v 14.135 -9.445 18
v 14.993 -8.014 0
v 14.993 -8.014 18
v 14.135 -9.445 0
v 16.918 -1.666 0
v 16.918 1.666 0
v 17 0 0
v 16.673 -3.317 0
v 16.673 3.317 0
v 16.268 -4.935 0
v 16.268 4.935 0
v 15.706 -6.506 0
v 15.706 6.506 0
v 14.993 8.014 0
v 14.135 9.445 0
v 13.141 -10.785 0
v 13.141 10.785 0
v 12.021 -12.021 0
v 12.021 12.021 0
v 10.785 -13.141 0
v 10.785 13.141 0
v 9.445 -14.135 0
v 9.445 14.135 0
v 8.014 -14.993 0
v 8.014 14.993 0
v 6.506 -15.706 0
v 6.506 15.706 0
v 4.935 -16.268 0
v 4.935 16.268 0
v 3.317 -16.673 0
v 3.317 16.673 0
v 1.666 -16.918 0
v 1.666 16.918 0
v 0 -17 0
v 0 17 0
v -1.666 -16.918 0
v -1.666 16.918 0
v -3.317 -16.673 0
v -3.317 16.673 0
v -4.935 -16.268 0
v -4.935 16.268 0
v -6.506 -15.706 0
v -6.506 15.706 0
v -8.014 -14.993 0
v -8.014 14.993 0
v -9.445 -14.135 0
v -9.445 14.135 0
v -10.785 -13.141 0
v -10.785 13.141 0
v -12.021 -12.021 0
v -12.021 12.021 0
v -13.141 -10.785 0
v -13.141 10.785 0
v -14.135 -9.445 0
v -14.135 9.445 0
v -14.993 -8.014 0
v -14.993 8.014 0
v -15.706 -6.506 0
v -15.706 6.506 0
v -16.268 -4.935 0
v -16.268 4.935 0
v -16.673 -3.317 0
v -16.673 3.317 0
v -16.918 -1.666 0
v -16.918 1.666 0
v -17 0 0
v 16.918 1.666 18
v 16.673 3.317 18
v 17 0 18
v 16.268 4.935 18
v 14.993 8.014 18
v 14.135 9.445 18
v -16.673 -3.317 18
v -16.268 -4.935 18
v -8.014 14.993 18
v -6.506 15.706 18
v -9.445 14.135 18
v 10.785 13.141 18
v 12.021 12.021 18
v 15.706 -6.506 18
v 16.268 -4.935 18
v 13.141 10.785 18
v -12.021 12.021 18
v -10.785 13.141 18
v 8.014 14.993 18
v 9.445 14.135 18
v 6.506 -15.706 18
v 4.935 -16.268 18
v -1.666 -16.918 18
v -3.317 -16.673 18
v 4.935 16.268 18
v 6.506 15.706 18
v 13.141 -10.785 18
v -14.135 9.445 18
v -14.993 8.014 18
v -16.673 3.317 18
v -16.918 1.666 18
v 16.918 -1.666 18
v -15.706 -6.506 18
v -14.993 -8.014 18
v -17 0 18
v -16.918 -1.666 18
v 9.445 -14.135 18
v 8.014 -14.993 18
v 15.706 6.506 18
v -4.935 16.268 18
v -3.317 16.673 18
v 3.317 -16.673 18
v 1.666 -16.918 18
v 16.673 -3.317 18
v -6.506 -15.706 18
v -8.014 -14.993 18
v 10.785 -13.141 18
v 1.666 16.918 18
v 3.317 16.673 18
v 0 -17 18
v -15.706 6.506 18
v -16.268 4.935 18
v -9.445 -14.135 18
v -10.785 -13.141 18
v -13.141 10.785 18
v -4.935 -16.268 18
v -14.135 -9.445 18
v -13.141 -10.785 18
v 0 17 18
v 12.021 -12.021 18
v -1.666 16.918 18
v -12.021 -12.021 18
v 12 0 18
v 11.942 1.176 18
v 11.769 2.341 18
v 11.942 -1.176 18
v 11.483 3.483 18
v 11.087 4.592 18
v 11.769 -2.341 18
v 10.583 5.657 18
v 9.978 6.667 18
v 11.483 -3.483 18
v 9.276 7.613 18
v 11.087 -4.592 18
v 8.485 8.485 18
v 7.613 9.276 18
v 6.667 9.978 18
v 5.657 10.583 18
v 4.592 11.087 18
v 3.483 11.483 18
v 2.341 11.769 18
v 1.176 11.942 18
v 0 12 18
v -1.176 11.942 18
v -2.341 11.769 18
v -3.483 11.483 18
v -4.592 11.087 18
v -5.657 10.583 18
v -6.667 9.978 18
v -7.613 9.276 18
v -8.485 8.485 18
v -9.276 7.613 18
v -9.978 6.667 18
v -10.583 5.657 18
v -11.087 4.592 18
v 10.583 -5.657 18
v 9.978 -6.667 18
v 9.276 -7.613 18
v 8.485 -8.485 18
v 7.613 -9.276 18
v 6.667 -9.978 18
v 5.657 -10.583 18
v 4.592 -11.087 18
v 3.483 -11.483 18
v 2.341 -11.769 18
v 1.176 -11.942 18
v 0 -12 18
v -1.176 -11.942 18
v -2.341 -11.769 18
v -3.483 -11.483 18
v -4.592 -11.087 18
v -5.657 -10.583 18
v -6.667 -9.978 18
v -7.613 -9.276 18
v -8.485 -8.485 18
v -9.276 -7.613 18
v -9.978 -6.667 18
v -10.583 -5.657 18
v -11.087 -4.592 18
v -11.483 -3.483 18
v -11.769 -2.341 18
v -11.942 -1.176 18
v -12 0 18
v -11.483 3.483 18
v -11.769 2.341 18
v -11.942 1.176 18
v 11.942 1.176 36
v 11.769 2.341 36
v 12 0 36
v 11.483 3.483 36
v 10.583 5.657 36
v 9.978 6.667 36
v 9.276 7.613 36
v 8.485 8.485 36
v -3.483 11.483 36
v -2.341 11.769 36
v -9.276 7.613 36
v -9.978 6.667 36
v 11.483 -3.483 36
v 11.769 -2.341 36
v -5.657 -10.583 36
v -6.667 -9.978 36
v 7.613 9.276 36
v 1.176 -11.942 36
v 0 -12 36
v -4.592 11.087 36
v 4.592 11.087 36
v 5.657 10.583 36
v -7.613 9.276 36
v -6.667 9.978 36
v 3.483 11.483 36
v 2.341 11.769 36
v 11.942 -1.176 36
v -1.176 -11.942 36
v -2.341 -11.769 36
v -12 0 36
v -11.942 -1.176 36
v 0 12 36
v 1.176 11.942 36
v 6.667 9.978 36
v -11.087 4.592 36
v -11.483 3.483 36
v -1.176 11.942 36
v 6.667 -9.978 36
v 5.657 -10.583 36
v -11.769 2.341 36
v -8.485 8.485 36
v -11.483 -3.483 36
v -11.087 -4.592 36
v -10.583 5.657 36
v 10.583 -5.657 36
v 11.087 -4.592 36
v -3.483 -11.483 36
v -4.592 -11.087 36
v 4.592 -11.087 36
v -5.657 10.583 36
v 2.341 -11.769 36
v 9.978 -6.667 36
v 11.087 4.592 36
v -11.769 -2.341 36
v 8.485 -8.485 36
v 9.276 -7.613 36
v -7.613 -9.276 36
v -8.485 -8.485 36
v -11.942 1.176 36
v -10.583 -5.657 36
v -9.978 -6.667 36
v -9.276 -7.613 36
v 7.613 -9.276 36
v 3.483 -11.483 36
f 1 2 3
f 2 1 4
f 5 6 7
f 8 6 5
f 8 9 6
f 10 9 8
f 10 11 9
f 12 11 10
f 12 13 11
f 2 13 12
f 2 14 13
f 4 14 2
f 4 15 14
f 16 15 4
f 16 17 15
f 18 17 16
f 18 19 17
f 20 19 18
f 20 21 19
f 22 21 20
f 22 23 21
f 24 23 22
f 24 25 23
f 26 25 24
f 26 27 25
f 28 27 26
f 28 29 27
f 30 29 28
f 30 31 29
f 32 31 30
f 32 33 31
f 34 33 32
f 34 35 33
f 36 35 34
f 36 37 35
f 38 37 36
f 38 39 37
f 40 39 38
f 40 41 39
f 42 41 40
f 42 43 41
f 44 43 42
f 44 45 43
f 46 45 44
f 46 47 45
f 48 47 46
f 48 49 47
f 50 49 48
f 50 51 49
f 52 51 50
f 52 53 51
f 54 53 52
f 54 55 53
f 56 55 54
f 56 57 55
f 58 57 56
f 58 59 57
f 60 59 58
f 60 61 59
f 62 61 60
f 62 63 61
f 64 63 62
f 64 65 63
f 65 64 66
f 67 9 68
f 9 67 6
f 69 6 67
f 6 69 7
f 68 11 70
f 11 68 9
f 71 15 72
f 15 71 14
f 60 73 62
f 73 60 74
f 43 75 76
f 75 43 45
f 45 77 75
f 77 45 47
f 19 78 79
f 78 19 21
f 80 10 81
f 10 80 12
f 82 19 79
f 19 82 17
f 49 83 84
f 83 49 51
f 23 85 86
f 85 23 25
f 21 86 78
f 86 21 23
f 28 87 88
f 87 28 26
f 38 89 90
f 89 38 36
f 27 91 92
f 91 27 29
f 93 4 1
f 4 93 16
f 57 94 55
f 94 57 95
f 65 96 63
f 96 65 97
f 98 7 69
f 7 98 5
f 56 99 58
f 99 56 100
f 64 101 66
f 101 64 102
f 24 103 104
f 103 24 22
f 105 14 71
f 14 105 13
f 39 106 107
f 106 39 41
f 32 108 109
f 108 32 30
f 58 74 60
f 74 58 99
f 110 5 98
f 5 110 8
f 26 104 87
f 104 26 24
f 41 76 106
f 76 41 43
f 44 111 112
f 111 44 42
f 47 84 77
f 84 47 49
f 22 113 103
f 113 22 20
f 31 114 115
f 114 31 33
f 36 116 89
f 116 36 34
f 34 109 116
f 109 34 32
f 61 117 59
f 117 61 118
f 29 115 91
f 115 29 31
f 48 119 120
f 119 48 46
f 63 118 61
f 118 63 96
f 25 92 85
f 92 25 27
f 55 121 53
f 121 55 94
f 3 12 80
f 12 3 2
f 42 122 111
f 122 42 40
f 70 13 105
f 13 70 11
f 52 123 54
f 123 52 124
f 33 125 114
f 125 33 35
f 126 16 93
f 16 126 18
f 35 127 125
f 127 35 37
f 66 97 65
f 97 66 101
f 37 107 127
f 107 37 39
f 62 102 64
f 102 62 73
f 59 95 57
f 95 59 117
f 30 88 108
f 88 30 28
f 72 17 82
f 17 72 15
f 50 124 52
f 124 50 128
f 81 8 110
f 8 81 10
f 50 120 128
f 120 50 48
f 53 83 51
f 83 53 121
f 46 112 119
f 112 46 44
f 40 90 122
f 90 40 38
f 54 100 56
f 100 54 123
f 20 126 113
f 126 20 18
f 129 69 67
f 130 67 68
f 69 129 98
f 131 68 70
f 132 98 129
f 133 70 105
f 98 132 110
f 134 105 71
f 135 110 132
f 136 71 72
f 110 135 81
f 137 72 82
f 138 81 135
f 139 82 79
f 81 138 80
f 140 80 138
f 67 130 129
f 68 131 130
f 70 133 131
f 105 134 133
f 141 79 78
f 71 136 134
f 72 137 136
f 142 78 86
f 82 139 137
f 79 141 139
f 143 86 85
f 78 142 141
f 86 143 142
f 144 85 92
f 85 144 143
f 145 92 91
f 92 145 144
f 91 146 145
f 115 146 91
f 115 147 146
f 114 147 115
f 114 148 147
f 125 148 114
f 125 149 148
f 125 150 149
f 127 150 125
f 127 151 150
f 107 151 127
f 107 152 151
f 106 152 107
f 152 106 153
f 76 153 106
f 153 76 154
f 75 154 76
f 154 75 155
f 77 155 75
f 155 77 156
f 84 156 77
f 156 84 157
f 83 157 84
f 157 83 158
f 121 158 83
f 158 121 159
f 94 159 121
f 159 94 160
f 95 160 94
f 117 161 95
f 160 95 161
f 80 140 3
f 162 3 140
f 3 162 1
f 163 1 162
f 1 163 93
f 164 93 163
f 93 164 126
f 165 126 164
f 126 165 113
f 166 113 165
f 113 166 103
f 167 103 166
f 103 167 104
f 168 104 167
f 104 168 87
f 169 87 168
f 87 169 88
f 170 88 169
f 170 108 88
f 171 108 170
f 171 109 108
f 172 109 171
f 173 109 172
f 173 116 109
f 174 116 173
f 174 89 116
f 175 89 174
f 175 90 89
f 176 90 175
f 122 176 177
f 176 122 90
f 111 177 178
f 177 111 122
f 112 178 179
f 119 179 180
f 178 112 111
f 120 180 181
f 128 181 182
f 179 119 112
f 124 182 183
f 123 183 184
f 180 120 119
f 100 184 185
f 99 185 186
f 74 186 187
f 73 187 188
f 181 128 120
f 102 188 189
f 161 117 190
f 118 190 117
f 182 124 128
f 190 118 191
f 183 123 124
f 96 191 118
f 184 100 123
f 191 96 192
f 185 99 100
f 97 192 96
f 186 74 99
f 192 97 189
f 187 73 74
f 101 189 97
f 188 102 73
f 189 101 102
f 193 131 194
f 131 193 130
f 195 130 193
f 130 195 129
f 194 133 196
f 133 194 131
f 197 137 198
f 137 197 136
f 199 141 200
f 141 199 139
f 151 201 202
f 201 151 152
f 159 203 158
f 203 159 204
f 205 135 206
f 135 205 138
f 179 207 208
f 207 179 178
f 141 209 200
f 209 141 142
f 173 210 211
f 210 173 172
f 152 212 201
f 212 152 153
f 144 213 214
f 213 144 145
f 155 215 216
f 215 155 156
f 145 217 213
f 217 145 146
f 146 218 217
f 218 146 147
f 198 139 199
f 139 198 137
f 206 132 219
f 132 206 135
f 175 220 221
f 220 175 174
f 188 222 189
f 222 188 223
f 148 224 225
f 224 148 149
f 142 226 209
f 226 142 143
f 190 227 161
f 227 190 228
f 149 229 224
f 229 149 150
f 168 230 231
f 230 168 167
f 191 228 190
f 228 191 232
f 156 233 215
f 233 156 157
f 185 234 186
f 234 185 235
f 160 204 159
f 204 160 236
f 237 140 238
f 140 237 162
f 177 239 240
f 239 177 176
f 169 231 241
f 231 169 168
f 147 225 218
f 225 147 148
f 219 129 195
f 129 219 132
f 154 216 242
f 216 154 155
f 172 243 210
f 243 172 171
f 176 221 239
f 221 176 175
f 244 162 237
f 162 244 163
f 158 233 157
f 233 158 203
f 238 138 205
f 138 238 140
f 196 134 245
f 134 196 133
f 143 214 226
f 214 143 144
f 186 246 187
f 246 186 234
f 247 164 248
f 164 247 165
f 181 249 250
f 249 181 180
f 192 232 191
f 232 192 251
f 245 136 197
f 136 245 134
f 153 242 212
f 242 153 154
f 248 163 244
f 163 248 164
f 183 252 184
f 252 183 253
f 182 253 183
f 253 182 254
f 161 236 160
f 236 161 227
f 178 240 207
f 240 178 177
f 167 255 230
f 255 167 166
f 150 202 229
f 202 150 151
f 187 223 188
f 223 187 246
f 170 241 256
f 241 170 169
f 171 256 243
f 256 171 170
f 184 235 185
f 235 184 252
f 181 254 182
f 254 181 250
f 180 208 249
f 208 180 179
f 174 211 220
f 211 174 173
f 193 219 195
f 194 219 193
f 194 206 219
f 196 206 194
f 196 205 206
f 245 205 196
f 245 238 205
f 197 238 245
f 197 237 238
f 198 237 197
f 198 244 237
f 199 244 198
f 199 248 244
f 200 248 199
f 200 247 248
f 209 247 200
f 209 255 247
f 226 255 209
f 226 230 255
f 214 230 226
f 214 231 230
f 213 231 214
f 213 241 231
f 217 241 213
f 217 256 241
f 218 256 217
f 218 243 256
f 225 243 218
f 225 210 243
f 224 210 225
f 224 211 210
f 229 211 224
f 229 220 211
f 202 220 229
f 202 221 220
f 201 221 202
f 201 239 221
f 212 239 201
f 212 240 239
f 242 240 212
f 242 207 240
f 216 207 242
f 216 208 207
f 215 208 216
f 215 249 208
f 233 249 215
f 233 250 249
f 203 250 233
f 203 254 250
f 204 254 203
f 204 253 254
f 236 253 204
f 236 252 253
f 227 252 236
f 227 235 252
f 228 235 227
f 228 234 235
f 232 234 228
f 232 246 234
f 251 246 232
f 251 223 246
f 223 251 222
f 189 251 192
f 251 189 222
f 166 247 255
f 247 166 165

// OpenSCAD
// Starter file for task-019.
// Edit this file in OpenSCAD to complete the requested hard task.
$fn = 64;

cylinder(d=34, h=18);
translate([0,0,18]) cylinder(d=24, h=18);
